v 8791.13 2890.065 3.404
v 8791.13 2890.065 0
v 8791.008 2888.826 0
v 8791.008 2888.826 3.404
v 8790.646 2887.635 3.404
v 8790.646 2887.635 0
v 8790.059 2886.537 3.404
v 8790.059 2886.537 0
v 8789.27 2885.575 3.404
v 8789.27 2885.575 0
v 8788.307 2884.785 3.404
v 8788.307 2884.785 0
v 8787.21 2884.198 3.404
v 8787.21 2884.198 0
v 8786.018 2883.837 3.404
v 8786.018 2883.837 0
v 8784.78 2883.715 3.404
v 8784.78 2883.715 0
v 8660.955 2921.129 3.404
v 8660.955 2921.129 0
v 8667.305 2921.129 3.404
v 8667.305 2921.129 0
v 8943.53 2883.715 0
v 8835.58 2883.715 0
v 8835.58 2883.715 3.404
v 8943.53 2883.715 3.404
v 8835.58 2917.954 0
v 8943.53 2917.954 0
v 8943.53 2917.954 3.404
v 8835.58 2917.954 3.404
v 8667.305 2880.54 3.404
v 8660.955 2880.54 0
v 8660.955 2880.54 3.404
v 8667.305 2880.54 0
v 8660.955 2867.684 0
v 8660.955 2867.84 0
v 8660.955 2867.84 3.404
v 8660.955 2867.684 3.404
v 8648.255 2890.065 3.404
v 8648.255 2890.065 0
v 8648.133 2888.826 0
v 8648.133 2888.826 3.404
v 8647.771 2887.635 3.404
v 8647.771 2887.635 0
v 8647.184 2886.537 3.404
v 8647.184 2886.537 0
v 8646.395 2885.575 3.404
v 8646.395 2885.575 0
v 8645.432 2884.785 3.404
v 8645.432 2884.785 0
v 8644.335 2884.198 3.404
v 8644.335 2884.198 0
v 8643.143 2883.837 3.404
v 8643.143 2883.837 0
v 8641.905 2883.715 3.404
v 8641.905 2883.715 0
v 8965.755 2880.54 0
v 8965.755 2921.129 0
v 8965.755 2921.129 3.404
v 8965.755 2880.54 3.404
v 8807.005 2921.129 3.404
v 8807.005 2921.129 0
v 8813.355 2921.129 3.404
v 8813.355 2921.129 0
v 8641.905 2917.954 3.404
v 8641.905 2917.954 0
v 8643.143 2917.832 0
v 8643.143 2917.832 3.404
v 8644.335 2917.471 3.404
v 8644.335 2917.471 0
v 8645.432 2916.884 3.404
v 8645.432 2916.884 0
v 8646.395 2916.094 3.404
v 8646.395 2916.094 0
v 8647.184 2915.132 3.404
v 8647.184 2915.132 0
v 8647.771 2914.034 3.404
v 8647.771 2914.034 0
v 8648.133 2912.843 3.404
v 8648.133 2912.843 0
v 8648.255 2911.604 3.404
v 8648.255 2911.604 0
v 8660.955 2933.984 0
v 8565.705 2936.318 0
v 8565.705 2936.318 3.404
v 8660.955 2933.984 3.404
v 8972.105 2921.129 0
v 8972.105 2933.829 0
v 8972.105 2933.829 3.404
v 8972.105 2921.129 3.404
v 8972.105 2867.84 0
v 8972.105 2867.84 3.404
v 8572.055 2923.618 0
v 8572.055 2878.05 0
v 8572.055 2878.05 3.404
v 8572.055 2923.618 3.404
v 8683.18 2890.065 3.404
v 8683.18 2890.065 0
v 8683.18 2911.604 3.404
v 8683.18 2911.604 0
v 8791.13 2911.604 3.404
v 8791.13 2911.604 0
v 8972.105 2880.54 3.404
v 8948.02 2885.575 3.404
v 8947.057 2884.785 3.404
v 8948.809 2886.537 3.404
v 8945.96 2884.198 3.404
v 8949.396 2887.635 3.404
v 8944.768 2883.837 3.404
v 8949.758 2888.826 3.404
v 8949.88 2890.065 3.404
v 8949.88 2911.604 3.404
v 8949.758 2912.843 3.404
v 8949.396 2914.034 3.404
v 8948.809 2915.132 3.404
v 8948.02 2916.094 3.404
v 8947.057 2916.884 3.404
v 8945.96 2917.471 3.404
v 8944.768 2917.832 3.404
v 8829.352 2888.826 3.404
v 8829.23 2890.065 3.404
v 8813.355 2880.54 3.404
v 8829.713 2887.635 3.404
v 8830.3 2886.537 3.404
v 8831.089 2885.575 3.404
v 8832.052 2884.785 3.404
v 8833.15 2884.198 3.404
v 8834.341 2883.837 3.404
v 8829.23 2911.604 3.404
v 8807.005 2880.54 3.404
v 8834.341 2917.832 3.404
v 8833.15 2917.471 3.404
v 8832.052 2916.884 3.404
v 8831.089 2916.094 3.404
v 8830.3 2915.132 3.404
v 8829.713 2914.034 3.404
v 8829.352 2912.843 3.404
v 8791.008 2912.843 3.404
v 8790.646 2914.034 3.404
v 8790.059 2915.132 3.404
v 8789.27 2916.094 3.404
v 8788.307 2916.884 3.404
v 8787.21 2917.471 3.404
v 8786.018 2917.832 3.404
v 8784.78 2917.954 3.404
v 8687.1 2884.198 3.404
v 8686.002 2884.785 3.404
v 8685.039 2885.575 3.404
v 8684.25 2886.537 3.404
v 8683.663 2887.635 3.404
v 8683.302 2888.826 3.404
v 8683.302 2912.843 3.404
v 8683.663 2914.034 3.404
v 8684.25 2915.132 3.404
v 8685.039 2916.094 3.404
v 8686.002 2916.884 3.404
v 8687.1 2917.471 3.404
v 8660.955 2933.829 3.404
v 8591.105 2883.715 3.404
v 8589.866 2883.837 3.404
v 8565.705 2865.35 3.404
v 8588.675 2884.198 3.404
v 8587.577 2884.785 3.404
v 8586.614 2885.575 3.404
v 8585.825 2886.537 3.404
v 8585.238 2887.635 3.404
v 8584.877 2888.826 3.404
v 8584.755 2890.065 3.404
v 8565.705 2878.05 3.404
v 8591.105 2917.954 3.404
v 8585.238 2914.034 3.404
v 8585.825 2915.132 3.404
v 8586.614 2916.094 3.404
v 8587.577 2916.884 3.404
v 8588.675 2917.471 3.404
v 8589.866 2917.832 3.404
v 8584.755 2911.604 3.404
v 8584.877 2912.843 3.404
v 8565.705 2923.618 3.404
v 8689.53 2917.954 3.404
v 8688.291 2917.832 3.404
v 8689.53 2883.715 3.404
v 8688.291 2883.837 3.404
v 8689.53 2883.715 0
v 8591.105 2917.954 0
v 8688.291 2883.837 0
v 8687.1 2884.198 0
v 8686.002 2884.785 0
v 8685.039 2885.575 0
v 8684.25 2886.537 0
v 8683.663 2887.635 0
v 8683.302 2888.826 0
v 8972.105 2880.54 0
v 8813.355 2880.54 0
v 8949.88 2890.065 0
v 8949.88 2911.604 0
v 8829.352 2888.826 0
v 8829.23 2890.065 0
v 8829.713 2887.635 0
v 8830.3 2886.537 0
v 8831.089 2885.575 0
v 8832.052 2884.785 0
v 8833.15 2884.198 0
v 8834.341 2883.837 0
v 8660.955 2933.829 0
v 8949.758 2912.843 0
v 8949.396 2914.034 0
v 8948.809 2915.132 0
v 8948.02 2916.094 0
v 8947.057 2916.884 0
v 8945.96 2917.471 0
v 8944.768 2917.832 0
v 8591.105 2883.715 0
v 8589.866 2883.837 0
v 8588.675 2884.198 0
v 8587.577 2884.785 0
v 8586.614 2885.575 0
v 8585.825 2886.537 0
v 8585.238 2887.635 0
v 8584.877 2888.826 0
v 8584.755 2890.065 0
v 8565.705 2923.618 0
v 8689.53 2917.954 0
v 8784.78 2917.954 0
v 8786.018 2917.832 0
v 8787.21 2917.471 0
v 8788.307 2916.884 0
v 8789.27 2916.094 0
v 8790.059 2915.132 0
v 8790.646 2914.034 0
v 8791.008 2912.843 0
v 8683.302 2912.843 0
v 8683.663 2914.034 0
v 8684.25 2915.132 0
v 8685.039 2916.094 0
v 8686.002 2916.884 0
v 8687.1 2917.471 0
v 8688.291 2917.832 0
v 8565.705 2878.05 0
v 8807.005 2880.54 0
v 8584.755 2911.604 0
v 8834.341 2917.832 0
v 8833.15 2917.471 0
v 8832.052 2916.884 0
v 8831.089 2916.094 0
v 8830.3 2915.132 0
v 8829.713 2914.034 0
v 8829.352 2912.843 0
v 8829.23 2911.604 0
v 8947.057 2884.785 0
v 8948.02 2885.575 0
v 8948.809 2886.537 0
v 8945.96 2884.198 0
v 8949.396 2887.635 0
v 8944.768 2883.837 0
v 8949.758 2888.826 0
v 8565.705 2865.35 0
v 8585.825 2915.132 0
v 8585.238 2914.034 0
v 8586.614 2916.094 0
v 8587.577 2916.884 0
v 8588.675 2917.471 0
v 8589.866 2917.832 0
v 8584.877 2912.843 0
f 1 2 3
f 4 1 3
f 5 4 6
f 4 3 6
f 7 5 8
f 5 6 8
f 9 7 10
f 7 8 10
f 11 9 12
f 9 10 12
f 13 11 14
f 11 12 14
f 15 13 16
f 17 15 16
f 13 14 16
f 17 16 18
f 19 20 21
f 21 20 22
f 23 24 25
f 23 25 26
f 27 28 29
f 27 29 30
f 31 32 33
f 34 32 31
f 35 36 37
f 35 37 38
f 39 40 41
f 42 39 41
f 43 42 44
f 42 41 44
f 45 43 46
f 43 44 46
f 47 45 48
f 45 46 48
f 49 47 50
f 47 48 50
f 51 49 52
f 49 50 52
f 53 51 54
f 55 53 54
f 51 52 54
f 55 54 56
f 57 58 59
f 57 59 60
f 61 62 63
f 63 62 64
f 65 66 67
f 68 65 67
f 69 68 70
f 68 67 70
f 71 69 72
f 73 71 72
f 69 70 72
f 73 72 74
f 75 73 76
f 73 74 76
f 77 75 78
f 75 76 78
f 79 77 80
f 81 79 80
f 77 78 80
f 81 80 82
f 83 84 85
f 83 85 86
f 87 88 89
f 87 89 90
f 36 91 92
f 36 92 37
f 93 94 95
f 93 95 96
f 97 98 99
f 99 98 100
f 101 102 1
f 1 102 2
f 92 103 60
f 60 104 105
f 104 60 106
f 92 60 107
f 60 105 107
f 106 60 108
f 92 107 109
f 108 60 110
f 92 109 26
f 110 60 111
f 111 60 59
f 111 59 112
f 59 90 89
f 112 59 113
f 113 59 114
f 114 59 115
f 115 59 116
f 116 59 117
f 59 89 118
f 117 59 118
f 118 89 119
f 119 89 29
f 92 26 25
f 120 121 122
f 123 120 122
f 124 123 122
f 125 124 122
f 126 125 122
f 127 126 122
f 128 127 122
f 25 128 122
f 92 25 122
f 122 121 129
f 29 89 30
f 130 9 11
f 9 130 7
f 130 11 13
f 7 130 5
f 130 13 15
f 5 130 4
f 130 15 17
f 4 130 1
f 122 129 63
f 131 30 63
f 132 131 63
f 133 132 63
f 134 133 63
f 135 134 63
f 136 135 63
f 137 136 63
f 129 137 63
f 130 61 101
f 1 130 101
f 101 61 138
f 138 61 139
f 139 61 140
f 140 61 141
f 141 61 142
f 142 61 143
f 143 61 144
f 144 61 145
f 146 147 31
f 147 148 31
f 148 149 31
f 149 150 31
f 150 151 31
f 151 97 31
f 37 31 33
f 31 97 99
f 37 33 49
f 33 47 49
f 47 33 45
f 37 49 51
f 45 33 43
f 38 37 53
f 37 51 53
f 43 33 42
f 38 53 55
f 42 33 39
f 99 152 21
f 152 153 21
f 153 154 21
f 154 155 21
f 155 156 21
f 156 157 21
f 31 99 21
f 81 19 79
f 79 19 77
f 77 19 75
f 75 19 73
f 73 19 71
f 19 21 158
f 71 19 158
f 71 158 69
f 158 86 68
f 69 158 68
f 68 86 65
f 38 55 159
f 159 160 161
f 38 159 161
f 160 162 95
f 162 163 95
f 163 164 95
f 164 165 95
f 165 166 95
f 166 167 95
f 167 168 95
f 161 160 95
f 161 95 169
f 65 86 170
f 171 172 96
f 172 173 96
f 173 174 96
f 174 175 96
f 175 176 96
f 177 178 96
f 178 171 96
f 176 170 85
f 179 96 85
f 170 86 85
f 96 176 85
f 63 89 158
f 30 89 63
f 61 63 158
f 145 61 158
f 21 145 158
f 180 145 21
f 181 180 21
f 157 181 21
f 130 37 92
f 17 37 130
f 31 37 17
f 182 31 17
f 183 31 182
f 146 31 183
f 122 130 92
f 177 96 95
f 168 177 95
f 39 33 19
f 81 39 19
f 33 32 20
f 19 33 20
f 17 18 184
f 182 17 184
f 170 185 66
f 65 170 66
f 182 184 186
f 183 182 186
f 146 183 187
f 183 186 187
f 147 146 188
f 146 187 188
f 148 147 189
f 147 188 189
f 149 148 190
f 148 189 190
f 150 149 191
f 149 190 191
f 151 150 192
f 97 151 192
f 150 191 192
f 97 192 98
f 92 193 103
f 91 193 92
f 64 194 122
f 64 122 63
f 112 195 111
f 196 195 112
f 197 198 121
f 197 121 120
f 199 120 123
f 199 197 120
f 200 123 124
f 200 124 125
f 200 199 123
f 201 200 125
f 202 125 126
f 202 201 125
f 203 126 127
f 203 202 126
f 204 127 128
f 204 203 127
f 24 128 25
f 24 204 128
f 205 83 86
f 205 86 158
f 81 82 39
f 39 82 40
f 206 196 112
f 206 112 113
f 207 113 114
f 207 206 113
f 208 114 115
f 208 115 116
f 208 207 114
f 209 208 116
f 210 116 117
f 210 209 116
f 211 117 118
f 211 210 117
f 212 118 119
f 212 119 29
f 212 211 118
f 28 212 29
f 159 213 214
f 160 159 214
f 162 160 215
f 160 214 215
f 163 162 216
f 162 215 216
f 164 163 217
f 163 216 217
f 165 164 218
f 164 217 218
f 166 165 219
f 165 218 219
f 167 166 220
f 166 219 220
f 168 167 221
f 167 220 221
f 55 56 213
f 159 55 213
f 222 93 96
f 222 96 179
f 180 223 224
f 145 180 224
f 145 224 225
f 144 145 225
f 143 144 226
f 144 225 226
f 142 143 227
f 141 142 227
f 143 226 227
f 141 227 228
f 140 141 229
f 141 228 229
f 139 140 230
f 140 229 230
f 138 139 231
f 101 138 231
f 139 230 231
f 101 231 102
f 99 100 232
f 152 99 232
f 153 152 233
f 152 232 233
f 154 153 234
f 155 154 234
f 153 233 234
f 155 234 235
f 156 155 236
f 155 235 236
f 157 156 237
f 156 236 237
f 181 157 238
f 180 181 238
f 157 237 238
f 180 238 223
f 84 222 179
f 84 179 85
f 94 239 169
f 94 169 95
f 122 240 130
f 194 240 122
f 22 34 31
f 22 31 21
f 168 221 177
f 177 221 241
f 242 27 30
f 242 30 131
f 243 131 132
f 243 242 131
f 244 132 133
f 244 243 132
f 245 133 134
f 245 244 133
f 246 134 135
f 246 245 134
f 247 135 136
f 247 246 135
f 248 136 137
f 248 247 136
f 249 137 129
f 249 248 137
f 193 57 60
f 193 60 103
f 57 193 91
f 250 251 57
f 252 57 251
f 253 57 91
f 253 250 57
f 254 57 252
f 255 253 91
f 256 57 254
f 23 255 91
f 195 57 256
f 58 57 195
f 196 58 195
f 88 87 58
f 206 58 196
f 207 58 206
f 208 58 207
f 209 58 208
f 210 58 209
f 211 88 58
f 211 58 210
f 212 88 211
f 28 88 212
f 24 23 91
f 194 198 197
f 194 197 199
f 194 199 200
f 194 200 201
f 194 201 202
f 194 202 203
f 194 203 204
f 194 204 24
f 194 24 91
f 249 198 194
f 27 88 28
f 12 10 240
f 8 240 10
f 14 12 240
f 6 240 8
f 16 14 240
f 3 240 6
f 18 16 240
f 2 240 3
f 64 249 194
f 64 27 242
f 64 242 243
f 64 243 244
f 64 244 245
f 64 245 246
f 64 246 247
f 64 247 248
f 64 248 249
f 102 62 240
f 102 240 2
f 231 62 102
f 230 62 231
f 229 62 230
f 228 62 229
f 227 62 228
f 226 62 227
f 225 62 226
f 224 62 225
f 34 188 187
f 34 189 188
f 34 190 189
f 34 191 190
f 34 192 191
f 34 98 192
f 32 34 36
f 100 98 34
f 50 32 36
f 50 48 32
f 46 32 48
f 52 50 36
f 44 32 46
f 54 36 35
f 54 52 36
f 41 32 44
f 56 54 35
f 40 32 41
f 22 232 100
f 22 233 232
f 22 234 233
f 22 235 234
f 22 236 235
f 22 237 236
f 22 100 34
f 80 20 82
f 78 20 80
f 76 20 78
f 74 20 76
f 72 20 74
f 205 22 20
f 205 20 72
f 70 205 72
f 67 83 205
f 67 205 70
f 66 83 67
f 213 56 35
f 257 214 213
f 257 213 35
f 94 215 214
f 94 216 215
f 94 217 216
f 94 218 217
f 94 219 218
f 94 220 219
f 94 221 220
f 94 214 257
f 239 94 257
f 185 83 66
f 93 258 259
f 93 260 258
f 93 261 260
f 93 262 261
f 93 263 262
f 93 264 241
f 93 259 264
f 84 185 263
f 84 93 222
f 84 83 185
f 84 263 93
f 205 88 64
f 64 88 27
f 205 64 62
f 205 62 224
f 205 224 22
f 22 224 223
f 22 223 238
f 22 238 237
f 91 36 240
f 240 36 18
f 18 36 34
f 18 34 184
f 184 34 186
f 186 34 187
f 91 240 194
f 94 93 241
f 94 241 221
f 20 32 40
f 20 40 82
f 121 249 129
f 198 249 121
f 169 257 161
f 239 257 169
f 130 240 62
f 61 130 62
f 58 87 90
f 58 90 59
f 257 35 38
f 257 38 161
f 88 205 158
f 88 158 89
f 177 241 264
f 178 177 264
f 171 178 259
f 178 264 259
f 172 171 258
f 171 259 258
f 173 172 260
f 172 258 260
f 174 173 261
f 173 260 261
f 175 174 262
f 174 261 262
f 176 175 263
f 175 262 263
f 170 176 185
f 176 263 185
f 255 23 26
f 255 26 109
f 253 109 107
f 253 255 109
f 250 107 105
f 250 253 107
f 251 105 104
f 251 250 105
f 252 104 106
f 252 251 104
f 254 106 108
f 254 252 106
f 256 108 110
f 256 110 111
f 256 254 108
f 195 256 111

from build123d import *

# Parameters (mm, degrees)
SKETCH1_W           = 6.35
SKETCH1_H           = 40.5892
BOSS_EXTRUDE1_DEPTH = 3.4036


with BuildPart() as part:
    # Sketch1 → Boss-Extrude1 (new body)
    with BuildSketch(Plane.XY):
        Polygon((8565.704586486, 2936.318079168), (8660.954586486, 2933.984454168), (8660.954586486, 2933.828879168), (8972.104586486, 2933.828879168), (8972.104586486, 2921.128879168), (8965.754586486, 2921.128879168), (8965.754586486, 2880.539679168), (8972.104586486, 2880.539679168), (8972.104586486, 2867.839679168), (8660.954586486, 2867.839679168), (8660.954586486, 2867.684104168), (8565.704586486, 2865.350479168), (8565.704586486, 2878.050479168), (8572.054586486, 2878.050479168), (8572.054586486, 2923.618079168), (8565.704586486, 2923.618079168), align=None)
        with Locations((8664.129586486, 2900.834279168)):
            Rectangle(SKETCH1_W, SKETCH1_H, mode=Mode.SUBTRACT)
        with BuildLine():
            Line((8683.179586486, 2890.064679168), (8683.179586486, 2911.603879168))
            ThreePointArc((8683.179586486, 2911.603879168), (8685.039458425, 2916.094007229), (8689.529586486, 2917.953879168))
            Line((8689.529586486, 2917.953879168), (8784.779586486, 2917.953879168))
            ThreePointArc((8784.779586486, 2917.953879168), (8789.269714547, 2916.094007229), (8791.129586486, 2911.603879168))
            Line((8791.129586486, 2911.603879168), (8791.129586486, 2890.064679168))
            ThreePointArc((8791.129586486, 2890.064679168), (8789.269714547, 2885.574551108), (8784.779586486, 2883.714679168))
            Line((8784.779586486, 2883.714679168), (8689.529586486, 2883.714679168))
            ThreePointArc((8689.529586486, 2883.714679168), (8685.039458425, 2885.574551108), (8683.179586486, 2890.064679168))
        make_face(mode=Mode.SUBTRACT)
        with BuildLine():
            Line((8648.254586486, 2911.603879168), (8648.254586486, 2890.064679168))
            ThreePointArc((8648.254586486, 2890.064679168), (8646.394714547, 2885.574551108), (8641.904586486, 2883.714679168))
            Line((8641.904586486, 2883.714679168), (8591.104586486, 2883.714679168))
            ThreePointArc((8591.104586486, 2883.714679168), (8586.614458425, 2885.574551108), (8584.754586486, 2890.064679168))
            Line((8584.754586486, 2890.064679168), (8584.754586486, 2911.603879168))
            ThreePointArc((8584.754586486, 2911.603879168), (8586.614458425, 2916.094007229), (8591.104586486, 2917.953879168))
            Line((8591.104586486, 2917.953879168), (8641.904586486, 2917.953879168))
            ThreePointArc((8641.904586486, 2917.953879168), (8646.394714547, 2916.094007229), (8648.254586486, 2911.603879168))
        make_face(mode=Mode.SUBTRACT)
        with BuildLine():
            Line((8943.529586486, 2917.953879168), (8835.579586486, 2917.953879168))
            ThreePointArc((8835.579586486, 2917.953879168), (8831.089458425, 2916.094007229), (8829.229586486, 2911.603879168))
            Line((8829.229586486, 2911.603879168), (8829.229586486, 2890.064679168))
            ThreePointArc((8829.229586486, 2890.064679168), (8831.089458425, 2885.574551108), (8835.579586486, 2883.714679168))
            Line((8835.579586486, 2883.714679168), (8943.529586486, 2883.714679168))
            ThreePointArc((8943.529586486, 2883.714679168), (8948.019714547, 2885.574551108), (8949.879586486, 2890.064679168))
            Line((8949.879586486, 2890.064679168), (8949.879586486, 2911.603879168))
            ThreePointArc((8949.879586486, 2911.603879168), (8948.019714547, 2916.094007229), (8943.529586486, 2917.953879168))
        make_face(mode=Mode.SUBTRACT)
        with Locations((8810.179586486, 2900.834279168)):
            Rectangle(SKETCH1_W, SKETCH1_H, mode=Mode.SUBTRACT)
    extrude(amount=BOSS_EXTRUDE1_DEPTH)


solid = part.part
